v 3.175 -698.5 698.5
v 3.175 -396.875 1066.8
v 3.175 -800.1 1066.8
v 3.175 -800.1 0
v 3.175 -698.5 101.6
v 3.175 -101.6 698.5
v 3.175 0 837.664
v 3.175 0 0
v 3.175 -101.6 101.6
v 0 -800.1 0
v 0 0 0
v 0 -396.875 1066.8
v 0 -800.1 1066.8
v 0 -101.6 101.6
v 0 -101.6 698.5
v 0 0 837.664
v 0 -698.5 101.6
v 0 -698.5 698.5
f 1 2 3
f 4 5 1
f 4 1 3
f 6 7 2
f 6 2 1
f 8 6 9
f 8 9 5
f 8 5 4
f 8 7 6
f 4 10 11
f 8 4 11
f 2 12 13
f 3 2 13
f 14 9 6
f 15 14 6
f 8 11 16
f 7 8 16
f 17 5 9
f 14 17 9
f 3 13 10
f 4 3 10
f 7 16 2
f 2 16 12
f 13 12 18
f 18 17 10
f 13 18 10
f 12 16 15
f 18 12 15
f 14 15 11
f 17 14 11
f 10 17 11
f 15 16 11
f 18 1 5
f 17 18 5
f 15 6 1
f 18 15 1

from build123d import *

# Parameters (mm, degrees)
BOSS_EXTRUDE1_DEPTH = 3.175
CUT_EXTRUDE1_REACH  = 5.175


with BuildPart() as part:
    # Sketch1 → Boss-Extrude1 (new body)
    with BuildSketch(Plane(origin=(0, 0, 0), x_dir=(0, 0, -1), z_dir=(1, 0, 0))):
        Polygon((0, 0), (-837.664111915, 0), (-1066.8, -396.875), (-1066.8, -800.1), (0, -800.1), align=None)
    extrude(amount=BOSS_EXTRUDE1_DEPTH)

    # Sketch2 → Cut-Extrude1 (cut, up to next)
    with BuildSketch(Plane(origin=(3.175, 0, 0), x_dir=(0, 0, -1), z_dir=(1, 0, 0)), mode=Mode.PRIVATE) as cut_extrude1_sk1:
        Polygon((-101.6, -396.875), (-101.6, -101.6), (-698.5, -101.6), (-698.5, -698.5), (-101.6, -698.5), align=None)
    cut_extrude1_tool1 = extrude(cut_extrude1_sk1.sketch, amount=-CUT_EXTRUDE1_REACH, mode=Mode.PRIVATE) & part.part
    add(cut_extrude1_tool1.solids().sort_by_distance((3.175, -400.05, 400.05))[0], mode=Mode.SUBTRACT)


solid = part.part
